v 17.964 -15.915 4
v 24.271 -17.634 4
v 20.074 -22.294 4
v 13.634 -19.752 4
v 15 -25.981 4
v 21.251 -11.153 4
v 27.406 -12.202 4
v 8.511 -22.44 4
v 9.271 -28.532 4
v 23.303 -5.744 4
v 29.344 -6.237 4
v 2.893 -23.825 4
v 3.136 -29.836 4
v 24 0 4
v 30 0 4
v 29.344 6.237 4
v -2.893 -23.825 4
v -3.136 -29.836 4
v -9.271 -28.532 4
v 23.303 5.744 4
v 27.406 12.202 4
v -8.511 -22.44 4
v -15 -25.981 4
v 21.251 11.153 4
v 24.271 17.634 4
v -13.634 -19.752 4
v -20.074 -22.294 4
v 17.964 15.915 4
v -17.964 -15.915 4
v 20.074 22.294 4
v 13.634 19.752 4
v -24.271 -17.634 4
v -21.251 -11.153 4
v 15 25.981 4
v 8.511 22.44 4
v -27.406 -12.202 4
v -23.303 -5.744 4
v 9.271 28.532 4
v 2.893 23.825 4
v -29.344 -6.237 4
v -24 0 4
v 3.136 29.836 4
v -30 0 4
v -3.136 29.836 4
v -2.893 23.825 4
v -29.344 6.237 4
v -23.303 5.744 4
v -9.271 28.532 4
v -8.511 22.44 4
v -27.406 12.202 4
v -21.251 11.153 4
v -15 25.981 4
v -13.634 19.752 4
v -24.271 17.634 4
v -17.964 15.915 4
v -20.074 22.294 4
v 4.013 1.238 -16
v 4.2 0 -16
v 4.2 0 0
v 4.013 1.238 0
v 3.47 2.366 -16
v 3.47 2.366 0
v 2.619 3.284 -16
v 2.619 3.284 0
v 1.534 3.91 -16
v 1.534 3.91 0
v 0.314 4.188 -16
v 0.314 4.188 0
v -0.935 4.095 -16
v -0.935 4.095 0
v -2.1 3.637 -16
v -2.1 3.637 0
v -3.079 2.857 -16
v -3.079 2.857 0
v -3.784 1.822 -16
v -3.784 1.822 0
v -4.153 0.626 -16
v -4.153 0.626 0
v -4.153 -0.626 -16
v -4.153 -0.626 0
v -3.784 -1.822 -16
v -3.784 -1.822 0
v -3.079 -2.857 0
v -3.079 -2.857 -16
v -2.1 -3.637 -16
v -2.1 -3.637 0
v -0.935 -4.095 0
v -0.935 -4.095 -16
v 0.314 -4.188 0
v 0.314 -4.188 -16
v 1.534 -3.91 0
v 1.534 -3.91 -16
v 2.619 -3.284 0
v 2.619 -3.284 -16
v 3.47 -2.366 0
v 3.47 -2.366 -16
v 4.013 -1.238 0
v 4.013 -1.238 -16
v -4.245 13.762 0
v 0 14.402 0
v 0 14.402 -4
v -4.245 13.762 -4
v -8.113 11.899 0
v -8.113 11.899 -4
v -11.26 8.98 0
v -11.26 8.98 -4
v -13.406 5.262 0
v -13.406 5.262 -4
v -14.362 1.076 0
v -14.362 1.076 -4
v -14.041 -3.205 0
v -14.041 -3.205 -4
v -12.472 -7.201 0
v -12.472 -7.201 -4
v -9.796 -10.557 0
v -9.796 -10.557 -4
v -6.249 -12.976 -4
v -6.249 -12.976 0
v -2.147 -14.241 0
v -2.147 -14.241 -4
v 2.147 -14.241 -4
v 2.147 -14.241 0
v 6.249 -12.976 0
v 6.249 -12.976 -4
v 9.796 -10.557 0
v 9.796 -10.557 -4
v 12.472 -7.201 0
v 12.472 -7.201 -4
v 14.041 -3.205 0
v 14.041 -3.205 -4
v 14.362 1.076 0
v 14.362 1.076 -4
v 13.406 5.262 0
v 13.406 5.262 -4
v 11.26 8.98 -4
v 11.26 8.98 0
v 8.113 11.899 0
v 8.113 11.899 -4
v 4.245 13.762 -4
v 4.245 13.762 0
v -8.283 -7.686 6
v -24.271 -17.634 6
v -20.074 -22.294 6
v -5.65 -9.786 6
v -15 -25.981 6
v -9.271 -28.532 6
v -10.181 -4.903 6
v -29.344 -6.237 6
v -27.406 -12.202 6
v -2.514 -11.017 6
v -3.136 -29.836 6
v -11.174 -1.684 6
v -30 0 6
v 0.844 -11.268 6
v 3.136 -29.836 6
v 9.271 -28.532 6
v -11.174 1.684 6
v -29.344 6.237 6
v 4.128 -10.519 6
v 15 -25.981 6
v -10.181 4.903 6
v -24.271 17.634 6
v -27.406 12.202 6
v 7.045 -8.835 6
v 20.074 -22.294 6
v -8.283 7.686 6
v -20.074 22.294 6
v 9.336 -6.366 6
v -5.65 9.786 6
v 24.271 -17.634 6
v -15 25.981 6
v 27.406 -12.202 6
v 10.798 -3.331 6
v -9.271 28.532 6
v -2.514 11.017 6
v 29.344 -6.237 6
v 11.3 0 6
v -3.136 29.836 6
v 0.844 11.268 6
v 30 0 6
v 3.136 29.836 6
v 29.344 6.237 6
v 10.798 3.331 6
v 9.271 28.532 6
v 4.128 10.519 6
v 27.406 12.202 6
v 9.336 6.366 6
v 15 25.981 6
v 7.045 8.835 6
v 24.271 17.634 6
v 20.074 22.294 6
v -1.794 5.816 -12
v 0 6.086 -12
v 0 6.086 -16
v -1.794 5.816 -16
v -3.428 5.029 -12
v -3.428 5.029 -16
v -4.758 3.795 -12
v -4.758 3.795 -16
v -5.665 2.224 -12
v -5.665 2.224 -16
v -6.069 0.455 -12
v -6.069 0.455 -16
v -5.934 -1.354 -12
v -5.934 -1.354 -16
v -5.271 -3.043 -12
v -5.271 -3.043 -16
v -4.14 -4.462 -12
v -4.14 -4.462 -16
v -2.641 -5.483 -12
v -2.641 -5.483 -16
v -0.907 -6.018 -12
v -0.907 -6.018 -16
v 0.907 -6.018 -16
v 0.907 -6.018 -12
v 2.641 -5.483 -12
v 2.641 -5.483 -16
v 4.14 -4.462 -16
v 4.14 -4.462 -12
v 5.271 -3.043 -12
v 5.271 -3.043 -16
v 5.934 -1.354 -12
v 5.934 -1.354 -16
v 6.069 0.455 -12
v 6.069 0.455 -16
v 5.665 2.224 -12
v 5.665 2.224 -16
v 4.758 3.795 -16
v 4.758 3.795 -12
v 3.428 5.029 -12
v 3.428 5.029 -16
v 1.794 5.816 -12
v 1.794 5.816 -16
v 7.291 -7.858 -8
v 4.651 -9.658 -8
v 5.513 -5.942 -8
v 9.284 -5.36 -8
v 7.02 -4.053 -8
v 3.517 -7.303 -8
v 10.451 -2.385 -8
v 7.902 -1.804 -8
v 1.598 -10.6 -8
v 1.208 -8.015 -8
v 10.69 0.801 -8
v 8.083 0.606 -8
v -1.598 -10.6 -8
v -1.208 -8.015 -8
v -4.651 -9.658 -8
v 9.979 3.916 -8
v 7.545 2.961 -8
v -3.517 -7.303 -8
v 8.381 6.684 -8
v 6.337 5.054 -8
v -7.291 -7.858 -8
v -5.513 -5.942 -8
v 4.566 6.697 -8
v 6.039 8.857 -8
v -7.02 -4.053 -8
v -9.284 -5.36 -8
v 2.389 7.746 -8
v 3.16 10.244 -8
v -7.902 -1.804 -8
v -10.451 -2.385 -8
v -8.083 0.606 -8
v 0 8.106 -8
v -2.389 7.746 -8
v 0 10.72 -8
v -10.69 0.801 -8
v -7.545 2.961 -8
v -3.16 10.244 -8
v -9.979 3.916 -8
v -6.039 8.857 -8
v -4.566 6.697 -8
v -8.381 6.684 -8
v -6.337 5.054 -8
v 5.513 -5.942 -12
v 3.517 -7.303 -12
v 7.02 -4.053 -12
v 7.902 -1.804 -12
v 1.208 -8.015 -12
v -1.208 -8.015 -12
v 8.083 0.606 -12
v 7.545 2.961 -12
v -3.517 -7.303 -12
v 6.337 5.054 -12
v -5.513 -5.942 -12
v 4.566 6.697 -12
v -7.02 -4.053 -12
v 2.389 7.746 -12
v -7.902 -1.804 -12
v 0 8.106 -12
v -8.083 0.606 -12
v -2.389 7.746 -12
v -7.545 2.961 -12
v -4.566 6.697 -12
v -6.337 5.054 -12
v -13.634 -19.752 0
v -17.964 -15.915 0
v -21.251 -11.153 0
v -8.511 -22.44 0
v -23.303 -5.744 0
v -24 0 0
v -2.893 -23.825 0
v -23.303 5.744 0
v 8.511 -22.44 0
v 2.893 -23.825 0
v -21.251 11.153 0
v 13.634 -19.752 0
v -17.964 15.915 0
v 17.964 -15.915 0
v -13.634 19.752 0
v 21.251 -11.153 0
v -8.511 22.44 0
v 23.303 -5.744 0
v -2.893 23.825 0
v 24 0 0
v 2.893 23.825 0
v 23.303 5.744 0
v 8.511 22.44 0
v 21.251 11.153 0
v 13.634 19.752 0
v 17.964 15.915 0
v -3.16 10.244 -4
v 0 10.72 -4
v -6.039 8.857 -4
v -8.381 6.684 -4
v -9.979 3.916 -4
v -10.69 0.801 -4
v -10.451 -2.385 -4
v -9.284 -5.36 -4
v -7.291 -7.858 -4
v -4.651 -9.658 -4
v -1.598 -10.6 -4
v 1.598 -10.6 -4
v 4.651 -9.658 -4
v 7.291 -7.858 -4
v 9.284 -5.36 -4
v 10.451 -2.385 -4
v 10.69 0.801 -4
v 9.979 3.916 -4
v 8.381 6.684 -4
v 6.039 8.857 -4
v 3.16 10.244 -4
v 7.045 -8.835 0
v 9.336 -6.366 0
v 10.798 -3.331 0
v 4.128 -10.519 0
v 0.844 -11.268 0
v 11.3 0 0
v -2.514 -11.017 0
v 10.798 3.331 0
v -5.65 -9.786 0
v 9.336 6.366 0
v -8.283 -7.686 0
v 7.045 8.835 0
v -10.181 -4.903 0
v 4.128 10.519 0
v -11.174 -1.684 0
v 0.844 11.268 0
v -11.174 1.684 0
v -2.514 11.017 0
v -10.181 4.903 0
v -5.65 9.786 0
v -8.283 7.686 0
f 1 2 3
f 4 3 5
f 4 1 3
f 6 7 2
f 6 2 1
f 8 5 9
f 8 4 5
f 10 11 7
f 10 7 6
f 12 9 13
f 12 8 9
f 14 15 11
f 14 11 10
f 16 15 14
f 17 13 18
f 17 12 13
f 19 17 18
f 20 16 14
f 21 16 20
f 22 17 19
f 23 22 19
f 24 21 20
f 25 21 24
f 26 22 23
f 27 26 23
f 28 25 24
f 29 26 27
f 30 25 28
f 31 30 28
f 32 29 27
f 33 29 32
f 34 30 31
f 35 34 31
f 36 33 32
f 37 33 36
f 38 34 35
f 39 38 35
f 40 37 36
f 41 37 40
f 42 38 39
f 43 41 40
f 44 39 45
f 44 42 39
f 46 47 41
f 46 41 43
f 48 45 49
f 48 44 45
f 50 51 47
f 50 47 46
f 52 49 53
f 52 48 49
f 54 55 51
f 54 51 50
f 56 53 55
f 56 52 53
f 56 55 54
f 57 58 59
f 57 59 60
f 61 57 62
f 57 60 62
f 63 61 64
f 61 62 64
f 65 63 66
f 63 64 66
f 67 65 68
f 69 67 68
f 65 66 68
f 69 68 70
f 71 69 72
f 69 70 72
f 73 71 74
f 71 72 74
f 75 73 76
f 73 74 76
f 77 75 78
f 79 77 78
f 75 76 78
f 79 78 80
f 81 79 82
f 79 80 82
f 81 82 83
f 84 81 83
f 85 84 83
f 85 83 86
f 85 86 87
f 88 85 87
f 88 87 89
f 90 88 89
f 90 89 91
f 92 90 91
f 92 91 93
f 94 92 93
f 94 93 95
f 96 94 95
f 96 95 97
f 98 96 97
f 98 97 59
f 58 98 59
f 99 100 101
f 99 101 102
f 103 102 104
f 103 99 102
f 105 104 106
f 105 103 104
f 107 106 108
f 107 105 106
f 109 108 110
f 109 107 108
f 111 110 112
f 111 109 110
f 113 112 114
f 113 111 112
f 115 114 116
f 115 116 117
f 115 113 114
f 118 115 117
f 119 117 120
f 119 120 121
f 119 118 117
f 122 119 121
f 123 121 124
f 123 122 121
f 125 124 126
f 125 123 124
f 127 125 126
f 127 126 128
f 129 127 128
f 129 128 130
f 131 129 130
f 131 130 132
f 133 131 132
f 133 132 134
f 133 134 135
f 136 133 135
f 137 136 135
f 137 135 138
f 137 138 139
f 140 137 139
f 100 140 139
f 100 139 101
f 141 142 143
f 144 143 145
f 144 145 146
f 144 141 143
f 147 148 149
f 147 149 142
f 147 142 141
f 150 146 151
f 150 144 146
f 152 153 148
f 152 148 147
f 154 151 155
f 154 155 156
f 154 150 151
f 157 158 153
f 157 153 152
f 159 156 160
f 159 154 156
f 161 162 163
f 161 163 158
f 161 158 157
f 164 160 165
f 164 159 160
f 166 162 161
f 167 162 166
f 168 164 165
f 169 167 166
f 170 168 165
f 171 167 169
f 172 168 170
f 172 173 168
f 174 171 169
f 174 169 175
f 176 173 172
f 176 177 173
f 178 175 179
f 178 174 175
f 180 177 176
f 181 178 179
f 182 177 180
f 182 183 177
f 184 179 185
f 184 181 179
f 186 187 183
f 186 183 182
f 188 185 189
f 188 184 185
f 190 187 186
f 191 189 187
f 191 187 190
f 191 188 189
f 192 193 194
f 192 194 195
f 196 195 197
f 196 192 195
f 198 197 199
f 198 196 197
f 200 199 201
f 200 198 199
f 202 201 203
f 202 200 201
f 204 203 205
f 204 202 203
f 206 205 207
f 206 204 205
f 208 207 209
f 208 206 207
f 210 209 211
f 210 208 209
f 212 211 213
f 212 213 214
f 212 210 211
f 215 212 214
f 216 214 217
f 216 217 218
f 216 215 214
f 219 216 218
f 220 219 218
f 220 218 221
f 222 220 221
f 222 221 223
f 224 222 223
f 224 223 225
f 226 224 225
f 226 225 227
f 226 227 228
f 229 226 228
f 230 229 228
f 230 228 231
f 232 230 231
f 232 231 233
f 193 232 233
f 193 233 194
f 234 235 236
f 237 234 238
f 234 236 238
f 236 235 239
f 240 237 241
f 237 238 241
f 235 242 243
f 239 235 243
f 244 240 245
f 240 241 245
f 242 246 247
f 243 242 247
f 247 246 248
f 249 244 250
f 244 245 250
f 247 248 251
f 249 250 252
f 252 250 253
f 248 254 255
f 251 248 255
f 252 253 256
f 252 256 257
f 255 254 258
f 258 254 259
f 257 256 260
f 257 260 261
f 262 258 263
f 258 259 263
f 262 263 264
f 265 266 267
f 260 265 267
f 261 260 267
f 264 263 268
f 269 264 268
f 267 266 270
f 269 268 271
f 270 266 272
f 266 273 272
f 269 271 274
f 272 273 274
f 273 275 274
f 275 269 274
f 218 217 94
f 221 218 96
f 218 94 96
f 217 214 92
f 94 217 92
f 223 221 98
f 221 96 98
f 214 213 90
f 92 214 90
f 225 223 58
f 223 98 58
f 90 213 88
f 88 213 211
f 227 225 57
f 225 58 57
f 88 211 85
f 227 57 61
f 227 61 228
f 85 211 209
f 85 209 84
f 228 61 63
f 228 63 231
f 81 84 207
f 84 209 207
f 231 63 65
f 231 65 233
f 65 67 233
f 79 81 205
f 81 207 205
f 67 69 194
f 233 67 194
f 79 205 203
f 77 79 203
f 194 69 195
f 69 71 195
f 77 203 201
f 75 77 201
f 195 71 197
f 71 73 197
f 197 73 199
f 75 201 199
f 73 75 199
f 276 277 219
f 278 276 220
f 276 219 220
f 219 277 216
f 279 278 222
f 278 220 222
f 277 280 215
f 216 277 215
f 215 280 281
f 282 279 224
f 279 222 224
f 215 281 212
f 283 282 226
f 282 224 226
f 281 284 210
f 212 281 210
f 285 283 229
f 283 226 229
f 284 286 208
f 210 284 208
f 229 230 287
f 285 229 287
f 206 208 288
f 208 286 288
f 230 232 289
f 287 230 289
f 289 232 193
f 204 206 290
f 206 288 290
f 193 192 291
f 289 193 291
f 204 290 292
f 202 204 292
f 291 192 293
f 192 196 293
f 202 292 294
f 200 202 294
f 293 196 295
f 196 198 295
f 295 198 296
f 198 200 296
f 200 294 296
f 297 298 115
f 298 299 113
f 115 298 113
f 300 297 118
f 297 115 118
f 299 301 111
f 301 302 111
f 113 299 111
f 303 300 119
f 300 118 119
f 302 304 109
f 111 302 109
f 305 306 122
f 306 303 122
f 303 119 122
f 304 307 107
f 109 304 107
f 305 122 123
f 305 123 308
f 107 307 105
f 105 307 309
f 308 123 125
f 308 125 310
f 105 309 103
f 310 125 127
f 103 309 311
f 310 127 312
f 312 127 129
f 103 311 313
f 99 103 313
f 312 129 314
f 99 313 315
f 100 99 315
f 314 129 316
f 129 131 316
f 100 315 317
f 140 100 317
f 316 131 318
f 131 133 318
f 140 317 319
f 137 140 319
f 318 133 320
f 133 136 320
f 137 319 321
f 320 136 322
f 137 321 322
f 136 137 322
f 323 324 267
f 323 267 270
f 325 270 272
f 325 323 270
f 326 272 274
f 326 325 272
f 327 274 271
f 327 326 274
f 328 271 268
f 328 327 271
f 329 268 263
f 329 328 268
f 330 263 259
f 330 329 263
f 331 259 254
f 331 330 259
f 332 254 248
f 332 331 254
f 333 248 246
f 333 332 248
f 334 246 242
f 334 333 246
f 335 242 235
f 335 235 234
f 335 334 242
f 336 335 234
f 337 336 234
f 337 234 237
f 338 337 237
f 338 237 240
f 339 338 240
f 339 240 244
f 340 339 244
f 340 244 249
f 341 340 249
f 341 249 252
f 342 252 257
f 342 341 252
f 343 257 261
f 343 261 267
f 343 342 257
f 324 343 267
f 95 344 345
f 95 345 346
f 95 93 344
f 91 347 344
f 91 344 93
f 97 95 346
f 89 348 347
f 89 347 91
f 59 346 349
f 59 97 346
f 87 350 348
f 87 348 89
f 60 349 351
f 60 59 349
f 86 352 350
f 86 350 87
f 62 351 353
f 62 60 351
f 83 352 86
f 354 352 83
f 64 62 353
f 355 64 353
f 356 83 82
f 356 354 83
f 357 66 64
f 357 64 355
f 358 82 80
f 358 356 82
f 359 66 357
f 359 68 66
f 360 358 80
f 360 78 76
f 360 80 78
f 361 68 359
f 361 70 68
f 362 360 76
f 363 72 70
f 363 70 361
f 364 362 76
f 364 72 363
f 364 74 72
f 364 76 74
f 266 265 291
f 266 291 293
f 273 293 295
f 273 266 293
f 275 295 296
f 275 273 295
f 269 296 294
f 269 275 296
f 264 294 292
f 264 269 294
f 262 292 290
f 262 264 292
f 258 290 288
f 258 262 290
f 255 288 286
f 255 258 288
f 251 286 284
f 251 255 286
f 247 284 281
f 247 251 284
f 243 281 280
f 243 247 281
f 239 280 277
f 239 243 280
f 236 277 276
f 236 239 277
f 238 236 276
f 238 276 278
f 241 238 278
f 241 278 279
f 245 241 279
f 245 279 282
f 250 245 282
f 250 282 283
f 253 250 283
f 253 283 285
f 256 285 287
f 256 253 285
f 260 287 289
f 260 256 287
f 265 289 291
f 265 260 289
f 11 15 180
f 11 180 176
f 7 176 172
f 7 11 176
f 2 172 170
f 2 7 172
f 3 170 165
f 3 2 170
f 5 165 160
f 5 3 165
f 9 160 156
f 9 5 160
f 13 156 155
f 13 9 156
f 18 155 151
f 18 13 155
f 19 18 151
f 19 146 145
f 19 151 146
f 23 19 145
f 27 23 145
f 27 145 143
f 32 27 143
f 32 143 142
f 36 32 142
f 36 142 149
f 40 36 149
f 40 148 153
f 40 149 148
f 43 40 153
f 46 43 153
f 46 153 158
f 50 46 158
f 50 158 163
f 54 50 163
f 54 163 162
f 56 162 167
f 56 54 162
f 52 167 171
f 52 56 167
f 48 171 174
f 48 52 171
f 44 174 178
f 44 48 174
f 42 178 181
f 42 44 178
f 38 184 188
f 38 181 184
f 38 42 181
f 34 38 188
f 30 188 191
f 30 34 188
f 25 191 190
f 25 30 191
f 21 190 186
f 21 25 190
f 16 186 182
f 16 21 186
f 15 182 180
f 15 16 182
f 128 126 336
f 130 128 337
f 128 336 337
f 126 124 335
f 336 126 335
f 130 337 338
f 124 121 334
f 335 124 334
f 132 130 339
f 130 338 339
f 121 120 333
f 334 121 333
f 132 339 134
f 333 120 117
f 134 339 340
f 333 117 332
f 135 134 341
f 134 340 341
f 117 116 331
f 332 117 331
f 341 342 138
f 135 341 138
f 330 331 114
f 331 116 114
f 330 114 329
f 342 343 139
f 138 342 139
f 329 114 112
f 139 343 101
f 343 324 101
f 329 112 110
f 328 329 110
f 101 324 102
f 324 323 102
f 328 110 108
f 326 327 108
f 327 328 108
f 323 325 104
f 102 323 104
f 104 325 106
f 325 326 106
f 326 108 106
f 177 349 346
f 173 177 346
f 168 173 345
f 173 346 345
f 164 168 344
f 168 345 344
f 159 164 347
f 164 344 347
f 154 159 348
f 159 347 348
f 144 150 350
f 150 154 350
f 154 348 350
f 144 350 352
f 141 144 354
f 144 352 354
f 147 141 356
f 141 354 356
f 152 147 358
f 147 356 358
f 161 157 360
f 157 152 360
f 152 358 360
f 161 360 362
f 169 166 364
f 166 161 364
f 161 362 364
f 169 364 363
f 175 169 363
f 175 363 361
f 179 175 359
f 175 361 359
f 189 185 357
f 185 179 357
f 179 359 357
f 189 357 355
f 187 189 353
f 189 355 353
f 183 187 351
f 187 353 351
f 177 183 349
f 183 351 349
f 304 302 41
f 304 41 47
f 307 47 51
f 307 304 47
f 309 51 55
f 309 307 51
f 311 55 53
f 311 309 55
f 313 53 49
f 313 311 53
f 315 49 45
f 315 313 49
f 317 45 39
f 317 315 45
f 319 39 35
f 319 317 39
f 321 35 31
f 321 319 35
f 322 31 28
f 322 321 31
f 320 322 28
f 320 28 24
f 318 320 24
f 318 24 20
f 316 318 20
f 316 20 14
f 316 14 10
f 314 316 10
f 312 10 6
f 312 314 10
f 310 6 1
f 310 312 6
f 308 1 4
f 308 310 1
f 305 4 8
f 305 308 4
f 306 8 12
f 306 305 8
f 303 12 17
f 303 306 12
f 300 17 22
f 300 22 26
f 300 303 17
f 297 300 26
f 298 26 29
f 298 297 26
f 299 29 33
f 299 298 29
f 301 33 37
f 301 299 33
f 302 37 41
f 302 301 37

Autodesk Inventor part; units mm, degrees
ref_plane "YZ Plane" through (0, 0, 0) normal (1, 0, 0) x (0, 1, 0)
ref_plane "XZ Plane" through (0, 0, 0) normal (0, 1, 0) x (-1, 0, 0)
ref_plane "XY Plane" through (0, 0, 0) normal (0, 0, 1) x (1, 0, 0)
sketch "Sketch1" plane through (0, 0, 0) normal (0, 0, 1) x (1, 0, 0)
  circle A0 centre (0, 0) radius 11.3
  circle A1 centre (0, 0) radius 30
  dimension "d0" = 22.6
  dimension "d1" = 60
extrude "Extrusion1" add sketch "Sketch1" along normal blind 6
sketch "Sketch2" plane through (0, 0, 0) normal (1, 0, 0) x (0, 1, 0)
  line L0 (-30, 0) -> (30, 0) projected
  line L1 (0, 0) -> (0, -22.2563)
  line L2 (0, -28.8) -> (0, 4.8) projected
  line L3 (20.103, -4) -> (-2.6994, -4) construction
  line L4 (20.103, -8) -> (-2.6994, -8) construction
  line L5 (20.103, -12) -> (-2.6994, -12) construction
  line L6 (20.103, -16) -> (-2.6994, -16) construction
  line L7 (20.103, -20) -> (-2.6994, -20) construction
  line L8 (20.103, -24) -> (-2.6994, -24) construction
  line L9 (10.7198, -8) -> (10.7198, -4)
  line L10 (14.402, -4) -> (10.7198, -4)
  line L11 (8.1057, -12) -> (8.1057, -8)
  line L12 (10.7198, -8) -> (8.1057, -8)
  line L13 (6.0862, -16) -> (6.0862, -12)
  line L14 (8.1057, -12) -> (6.0862, -12)
  line L15 (6.0862, -16) -> (4.4759, -16)
  line L16 (14.402, -4) -> (14.402, 0)
  line L17 (4.4759, -16) -> (0, -16)
  point P0 (0, -11.3553)
  point P1 (0, -24)
  point P2 (0, -20)
  dimension "d8" = 4
  dimension "d11" = 4
revolve "Revolution1" add sketch "Sketch2" angle 360 about axis through (0, 0, -10) along (0, 0, 1)
sketch "Sketch3" plane through (0, 0, 0) normal (0, 0, 1) x (1, 0, 0)
  circle A0 centre (0, 0) radius 4.2
  dimension "d5" = 8.4
extrude "Extrusion2" cut sketch "Sketch3" against normal through all
sketch "Sketch4" plane through (0, 0, 0) normal (0, 0, -1) x (-1, 0, 0)
  circle A0 centre (0, 0) radius 24
  circle A1 centre (0, 0) radius 30 projected
  dimension "d16" = 48
extrude "Extrusion3" cut sketch "Sketch4" against normal blind 4
properties part number "spool diam support"
